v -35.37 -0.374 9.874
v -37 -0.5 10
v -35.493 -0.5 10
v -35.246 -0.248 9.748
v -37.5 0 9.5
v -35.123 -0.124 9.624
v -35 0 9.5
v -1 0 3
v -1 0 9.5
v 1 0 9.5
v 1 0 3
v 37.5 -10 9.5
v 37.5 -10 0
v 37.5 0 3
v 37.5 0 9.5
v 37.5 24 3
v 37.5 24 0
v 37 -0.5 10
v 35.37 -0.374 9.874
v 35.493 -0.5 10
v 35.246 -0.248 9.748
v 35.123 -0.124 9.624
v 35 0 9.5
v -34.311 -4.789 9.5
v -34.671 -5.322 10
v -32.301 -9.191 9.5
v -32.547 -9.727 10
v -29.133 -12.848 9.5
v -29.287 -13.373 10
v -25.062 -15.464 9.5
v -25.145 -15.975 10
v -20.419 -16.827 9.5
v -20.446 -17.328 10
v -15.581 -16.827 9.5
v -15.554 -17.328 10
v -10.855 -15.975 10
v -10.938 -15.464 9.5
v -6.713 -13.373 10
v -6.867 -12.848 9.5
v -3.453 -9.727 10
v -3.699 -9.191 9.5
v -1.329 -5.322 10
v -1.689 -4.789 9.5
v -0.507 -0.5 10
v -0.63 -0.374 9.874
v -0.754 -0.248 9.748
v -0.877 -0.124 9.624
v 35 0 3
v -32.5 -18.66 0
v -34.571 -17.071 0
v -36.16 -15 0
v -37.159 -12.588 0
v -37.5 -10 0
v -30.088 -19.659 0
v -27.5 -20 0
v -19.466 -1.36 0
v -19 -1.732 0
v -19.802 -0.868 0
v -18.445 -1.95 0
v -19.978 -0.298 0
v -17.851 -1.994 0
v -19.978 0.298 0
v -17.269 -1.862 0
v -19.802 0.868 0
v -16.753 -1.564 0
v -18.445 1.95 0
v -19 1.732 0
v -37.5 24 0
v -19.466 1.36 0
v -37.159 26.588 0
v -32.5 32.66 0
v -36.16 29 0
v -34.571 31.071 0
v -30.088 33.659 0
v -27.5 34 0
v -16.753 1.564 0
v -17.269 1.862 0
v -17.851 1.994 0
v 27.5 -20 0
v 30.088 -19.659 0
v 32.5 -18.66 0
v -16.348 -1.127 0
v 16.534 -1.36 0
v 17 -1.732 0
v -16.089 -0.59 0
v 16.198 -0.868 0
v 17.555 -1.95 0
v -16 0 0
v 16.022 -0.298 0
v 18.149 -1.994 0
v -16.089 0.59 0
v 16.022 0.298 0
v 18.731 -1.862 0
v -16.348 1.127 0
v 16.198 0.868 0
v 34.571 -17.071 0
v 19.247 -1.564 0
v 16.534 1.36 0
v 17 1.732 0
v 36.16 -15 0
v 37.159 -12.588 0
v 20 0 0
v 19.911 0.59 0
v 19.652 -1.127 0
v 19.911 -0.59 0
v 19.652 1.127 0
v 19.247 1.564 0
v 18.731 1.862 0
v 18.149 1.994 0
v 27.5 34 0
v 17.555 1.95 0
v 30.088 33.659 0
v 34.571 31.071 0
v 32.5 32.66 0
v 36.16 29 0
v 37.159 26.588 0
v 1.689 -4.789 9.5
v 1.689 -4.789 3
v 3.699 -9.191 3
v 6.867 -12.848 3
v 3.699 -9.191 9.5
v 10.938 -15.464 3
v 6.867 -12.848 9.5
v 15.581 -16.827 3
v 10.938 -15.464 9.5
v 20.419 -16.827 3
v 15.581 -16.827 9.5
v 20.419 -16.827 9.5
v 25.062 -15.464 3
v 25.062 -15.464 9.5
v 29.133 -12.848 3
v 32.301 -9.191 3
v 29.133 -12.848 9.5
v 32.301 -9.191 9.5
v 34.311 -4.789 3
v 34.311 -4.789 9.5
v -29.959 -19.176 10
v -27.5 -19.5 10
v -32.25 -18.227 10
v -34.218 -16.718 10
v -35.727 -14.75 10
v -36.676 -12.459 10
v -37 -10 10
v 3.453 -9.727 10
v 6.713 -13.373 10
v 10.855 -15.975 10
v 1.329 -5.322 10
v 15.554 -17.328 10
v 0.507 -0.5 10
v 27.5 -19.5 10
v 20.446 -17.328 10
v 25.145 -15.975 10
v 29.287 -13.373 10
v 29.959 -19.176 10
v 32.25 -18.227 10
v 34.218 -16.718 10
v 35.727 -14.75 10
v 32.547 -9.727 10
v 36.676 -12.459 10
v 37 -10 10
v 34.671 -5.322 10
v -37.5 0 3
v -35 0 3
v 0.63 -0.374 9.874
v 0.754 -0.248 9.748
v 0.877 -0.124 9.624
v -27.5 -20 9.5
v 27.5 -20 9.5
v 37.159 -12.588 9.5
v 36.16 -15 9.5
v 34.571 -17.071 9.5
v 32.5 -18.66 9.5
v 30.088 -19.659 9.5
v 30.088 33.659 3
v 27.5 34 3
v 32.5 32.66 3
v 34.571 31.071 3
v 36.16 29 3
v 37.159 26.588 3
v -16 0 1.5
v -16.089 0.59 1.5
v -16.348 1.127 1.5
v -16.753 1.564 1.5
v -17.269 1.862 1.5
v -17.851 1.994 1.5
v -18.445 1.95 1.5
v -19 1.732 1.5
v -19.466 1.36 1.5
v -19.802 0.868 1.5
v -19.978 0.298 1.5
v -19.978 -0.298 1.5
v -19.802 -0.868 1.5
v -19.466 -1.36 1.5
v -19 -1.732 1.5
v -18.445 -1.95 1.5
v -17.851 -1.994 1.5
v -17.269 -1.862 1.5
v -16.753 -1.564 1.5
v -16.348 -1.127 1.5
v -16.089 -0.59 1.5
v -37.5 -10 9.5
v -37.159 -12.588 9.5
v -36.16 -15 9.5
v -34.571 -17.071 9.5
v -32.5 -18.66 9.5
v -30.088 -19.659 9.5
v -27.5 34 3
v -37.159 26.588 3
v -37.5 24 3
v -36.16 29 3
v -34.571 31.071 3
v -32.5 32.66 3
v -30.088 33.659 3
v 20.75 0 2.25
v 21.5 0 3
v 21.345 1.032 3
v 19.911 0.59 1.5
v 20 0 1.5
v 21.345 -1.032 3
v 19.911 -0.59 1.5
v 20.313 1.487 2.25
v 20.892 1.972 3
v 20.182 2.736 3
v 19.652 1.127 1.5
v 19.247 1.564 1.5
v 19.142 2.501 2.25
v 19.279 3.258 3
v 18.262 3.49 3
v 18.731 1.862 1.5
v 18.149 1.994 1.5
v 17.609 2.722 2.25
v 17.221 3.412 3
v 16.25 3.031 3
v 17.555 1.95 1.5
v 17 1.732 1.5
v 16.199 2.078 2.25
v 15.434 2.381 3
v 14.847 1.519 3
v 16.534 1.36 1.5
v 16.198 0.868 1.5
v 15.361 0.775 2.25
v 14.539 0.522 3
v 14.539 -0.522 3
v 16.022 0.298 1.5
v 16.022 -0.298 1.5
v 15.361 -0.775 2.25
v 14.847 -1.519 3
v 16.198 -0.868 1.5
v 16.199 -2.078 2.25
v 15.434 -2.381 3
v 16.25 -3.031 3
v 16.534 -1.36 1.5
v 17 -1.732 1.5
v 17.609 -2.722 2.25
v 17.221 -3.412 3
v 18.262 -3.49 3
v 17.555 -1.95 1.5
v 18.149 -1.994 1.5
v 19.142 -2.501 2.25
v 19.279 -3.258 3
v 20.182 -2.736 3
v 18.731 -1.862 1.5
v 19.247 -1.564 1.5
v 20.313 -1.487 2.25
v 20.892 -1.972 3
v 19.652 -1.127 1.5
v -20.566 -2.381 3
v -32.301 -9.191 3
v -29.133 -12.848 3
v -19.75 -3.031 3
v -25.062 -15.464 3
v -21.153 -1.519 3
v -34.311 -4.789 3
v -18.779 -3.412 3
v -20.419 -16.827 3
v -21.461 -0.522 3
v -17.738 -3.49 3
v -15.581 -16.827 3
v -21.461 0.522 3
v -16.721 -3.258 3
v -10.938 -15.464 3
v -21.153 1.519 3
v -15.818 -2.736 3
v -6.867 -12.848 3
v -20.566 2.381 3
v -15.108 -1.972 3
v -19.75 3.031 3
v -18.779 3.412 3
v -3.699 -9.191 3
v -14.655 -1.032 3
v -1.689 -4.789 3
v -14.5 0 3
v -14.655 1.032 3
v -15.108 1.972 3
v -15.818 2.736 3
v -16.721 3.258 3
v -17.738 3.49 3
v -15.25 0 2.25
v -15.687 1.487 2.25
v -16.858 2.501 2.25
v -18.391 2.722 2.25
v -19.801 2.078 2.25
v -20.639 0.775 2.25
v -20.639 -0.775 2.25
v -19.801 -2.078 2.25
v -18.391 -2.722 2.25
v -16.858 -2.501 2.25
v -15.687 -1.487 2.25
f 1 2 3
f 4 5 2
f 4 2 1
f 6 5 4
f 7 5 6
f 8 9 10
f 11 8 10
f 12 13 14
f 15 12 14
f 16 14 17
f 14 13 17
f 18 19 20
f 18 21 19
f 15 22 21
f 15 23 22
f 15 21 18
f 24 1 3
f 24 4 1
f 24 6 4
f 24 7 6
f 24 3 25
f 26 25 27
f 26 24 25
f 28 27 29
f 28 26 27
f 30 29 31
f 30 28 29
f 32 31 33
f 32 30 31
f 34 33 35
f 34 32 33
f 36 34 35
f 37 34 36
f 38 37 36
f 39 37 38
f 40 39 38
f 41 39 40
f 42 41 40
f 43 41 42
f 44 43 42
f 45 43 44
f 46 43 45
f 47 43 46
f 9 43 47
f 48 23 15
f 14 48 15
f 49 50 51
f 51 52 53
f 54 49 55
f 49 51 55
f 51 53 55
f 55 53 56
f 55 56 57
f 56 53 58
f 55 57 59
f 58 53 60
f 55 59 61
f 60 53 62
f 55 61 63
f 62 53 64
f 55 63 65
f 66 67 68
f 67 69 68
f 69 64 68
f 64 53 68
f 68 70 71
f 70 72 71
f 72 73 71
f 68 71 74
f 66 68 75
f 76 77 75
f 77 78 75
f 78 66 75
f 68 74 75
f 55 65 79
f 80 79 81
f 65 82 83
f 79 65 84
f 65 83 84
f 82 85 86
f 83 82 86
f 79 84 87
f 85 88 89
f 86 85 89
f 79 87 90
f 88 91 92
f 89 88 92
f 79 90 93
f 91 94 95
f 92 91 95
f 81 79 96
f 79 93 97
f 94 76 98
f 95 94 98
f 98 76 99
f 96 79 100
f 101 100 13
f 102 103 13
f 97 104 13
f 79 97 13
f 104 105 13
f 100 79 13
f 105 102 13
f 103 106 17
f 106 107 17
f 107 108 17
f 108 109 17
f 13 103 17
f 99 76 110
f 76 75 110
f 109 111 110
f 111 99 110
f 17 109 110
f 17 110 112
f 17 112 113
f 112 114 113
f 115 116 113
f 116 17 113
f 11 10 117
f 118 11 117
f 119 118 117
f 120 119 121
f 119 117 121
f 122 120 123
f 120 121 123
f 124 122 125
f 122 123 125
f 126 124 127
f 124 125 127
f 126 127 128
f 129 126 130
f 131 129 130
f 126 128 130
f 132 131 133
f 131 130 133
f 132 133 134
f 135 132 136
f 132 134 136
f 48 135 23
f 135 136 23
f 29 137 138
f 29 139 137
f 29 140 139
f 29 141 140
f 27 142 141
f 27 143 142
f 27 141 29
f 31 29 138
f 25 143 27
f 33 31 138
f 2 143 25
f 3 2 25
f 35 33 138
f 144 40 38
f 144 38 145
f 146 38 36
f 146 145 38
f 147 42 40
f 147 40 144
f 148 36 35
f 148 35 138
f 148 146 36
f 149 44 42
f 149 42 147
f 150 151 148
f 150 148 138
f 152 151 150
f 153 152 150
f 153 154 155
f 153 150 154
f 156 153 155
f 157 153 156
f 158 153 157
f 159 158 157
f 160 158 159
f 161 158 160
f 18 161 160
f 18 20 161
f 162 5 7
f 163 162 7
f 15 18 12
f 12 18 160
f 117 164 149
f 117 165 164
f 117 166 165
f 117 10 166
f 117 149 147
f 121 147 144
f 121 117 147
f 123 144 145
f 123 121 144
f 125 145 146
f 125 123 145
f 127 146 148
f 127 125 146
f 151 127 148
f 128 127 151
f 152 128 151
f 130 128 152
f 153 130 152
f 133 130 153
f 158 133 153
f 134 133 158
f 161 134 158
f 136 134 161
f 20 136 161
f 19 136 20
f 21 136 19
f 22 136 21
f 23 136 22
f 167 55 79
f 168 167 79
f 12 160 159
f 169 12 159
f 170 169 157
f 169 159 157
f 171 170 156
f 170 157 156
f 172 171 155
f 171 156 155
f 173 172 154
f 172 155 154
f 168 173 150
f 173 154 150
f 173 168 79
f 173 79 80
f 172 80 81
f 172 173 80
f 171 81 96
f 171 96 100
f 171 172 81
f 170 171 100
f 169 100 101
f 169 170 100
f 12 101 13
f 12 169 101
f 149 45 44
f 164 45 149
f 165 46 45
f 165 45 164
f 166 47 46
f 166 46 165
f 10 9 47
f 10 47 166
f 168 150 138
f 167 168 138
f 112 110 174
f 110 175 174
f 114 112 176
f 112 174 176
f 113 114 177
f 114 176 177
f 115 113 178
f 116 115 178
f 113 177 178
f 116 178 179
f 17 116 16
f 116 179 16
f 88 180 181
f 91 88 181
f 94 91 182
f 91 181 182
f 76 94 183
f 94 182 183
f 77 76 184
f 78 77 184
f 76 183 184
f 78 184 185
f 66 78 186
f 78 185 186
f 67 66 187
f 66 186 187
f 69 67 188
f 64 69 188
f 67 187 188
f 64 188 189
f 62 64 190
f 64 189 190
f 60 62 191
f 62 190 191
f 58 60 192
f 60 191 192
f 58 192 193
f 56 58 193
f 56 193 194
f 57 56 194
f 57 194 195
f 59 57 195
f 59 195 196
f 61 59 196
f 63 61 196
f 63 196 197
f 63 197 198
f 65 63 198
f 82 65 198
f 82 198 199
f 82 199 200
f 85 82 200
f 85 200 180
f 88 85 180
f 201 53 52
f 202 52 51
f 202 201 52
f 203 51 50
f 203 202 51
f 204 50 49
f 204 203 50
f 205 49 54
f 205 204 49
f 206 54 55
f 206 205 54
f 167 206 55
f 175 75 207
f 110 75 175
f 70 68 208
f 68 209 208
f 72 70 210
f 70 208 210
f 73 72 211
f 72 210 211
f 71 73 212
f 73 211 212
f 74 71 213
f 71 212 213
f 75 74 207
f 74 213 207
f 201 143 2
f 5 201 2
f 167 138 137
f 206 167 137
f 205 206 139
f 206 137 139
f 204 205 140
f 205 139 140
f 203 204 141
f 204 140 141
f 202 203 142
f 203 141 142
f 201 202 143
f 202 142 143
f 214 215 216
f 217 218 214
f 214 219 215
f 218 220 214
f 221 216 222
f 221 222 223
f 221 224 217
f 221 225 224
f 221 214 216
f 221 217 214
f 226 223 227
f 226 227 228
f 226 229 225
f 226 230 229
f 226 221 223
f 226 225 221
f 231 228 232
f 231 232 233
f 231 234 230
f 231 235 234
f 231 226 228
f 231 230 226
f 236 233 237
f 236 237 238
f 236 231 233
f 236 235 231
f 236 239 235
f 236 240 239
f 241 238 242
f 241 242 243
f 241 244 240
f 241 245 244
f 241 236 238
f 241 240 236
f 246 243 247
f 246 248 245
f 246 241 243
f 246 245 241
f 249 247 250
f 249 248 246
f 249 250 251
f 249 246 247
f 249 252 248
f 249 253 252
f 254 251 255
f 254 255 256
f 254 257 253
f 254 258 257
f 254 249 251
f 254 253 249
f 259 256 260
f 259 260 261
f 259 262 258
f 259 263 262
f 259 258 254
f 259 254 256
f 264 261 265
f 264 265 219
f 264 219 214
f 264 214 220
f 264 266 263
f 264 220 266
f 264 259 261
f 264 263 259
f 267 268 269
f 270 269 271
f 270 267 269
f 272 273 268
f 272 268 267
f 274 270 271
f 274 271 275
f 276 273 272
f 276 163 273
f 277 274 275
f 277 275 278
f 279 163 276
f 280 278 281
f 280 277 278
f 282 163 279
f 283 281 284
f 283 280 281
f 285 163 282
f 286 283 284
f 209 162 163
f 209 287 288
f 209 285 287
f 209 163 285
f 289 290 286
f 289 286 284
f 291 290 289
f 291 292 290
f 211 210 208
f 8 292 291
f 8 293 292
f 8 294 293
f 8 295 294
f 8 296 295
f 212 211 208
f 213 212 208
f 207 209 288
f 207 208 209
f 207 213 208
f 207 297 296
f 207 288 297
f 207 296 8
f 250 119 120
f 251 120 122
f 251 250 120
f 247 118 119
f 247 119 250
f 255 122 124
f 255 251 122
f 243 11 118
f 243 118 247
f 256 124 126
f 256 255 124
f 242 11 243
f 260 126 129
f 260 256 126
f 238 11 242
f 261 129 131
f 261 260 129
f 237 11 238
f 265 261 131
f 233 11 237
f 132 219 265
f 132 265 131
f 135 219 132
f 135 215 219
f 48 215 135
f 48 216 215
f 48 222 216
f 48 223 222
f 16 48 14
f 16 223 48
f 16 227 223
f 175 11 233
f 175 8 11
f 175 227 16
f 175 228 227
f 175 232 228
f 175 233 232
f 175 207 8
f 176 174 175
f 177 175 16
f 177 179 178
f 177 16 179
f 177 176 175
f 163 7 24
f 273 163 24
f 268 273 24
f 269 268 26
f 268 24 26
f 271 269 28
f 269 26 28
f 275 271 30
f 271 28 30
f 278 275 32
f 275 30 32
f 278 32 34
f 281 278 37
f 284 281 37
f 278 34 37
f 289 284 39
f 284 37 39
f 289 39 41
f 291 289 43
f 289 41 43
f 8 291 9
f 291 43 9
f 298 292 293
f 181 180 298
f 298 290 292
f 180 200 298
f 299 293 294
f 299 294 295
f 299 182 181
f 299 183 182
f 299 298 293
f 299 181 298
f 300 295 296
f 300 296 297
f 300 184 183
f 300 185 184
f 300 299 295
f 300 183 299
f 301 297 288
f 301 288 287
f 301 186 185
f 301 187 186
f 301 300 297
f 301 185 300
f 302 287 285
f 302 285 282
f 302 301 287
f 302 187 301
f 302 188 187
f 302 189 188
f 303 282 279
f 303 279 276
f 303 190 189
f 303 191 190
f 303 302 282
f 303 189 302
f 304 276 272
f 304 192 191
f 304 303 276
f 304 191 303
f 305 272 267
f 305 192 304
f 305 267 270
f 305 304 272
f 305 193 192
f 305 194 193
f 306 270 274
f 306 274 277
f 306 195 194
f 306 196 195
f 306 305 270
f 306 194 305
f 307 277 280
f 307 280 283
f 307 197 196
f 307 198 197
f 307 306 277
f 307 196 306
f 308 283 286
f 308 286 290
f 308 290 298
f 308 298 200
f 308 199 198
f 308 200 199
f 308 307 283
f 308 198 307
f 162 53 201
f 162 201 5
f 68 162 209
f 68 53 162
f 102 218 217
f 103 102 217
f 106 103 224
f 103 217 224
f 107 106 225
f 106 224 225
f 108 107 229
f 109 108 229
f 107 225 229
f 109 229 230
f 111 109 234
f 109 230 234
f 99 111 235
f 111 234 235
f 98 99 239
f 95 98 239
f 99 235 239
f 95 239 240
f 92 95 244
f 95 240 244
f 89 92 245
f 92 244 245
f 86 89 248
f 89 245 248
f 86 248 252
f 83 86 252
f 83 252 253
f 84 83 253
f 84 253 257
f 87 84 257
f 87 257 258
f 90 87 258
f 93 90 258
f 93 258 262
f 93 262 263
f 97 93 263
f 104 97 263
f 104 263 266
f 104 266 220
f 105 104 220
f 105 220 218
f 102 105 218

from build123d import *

# Parameters (mm, degrees)
SKETCH_W        = 75
SKETCH_H        = 54
PAD_DEPTH       = 10
SKETCH001_R     = 17
POCKET_DEPTH    = 7
SKETCH002_W     = 111.709
SKETCH002_H     = 38.0948
POCKET001_DEPTH = 7
SKETCH003_R     = 2
POCKET002_DEPTH = 10.001
FILLET_R        = 10
CHAMFER_SIZE    = 0.5
CHAMFER001_SIZE = 1.5


with BuildPart() as part:
    # Sketch → Pad (new body)
    with BuildSketch(Plane.XY):
        with Locations((0, 7)):
            Rectangle(SKETCH_W, SKETCH_H)
    extrude(amount=PAD_DEPTH)

    # Sketch001 → Pocket (cut)
    with BuildSketch(Plane.XY.offset(10)):
        with Locations((-18, 0)):
            Circle(SKETCH001_R)
        with Locations((18, 0)):
            Circle(SKETCH001_R)
    extrude(amount=-POCKET_DEPTH, mode=Mode.SUBTRACT)

    # Sketch002 → Pocket001 (cut)
    with BuildSketch(Plane.XY.offset(10)):
        with Locations((0, 19.0474)):
            Rectangle(SKETCH002_W, SKETCH002_H)
    extrude(amount=-POCKET001_DEPTH, mode=Mode.SUBTRACT)

    # Sketch003 → Pocket002 (cut, through all)
    with BuildSketch(Plane.XY.offset(10)):
        with Locations((-18, 0)):
            Circle(SKETCH003_R)
        with Locations((18, 0)):
            Circle(SKETCH003_R)
    extrude(amount=-POCKET002_DEPTH, mode=Mode.SUBTRACT)

    # Fillet
    fillet_edges = [part.edges().sort_by_distance(p)[0] for p in [
        (37.5, 34, 1.5),
        (-37.5, 34, 1.5),
        (-37.5, -20, 5),
        (37.5, -20, 5),
    ]]
    fillet(fillet_edges, radius=FILLET_R)

    # Chamfer
    chamfer_edges = [part.edges().sort_by_distance(p)[0] for p in [
        (-37.5, -5, 10),
        (-34.571068, -17.071068, 10),
        (-36.25, 0, 10),
        (0, -20, 10),
        (-18, -17, 10),
        (34.571068, -17.071068, 10),
        (0, 0, 10),
        (37.5, -5, 10),
        (18, -17, 10),
        (36.25, 0, 10),
    ]]
    chamfer(chamfer_edges, length=CHAMFER_SIZE)

    # Chamfer001
    chamfer001_edges = [part.edges().sort_by_distance(p)[0] for p in [
        (18, -2, 3),
        (-18, -2, 3),
    ]]
    chamfer(chamfer001_edges, length=CHAMFER001_SIZE)


solid = part.part
